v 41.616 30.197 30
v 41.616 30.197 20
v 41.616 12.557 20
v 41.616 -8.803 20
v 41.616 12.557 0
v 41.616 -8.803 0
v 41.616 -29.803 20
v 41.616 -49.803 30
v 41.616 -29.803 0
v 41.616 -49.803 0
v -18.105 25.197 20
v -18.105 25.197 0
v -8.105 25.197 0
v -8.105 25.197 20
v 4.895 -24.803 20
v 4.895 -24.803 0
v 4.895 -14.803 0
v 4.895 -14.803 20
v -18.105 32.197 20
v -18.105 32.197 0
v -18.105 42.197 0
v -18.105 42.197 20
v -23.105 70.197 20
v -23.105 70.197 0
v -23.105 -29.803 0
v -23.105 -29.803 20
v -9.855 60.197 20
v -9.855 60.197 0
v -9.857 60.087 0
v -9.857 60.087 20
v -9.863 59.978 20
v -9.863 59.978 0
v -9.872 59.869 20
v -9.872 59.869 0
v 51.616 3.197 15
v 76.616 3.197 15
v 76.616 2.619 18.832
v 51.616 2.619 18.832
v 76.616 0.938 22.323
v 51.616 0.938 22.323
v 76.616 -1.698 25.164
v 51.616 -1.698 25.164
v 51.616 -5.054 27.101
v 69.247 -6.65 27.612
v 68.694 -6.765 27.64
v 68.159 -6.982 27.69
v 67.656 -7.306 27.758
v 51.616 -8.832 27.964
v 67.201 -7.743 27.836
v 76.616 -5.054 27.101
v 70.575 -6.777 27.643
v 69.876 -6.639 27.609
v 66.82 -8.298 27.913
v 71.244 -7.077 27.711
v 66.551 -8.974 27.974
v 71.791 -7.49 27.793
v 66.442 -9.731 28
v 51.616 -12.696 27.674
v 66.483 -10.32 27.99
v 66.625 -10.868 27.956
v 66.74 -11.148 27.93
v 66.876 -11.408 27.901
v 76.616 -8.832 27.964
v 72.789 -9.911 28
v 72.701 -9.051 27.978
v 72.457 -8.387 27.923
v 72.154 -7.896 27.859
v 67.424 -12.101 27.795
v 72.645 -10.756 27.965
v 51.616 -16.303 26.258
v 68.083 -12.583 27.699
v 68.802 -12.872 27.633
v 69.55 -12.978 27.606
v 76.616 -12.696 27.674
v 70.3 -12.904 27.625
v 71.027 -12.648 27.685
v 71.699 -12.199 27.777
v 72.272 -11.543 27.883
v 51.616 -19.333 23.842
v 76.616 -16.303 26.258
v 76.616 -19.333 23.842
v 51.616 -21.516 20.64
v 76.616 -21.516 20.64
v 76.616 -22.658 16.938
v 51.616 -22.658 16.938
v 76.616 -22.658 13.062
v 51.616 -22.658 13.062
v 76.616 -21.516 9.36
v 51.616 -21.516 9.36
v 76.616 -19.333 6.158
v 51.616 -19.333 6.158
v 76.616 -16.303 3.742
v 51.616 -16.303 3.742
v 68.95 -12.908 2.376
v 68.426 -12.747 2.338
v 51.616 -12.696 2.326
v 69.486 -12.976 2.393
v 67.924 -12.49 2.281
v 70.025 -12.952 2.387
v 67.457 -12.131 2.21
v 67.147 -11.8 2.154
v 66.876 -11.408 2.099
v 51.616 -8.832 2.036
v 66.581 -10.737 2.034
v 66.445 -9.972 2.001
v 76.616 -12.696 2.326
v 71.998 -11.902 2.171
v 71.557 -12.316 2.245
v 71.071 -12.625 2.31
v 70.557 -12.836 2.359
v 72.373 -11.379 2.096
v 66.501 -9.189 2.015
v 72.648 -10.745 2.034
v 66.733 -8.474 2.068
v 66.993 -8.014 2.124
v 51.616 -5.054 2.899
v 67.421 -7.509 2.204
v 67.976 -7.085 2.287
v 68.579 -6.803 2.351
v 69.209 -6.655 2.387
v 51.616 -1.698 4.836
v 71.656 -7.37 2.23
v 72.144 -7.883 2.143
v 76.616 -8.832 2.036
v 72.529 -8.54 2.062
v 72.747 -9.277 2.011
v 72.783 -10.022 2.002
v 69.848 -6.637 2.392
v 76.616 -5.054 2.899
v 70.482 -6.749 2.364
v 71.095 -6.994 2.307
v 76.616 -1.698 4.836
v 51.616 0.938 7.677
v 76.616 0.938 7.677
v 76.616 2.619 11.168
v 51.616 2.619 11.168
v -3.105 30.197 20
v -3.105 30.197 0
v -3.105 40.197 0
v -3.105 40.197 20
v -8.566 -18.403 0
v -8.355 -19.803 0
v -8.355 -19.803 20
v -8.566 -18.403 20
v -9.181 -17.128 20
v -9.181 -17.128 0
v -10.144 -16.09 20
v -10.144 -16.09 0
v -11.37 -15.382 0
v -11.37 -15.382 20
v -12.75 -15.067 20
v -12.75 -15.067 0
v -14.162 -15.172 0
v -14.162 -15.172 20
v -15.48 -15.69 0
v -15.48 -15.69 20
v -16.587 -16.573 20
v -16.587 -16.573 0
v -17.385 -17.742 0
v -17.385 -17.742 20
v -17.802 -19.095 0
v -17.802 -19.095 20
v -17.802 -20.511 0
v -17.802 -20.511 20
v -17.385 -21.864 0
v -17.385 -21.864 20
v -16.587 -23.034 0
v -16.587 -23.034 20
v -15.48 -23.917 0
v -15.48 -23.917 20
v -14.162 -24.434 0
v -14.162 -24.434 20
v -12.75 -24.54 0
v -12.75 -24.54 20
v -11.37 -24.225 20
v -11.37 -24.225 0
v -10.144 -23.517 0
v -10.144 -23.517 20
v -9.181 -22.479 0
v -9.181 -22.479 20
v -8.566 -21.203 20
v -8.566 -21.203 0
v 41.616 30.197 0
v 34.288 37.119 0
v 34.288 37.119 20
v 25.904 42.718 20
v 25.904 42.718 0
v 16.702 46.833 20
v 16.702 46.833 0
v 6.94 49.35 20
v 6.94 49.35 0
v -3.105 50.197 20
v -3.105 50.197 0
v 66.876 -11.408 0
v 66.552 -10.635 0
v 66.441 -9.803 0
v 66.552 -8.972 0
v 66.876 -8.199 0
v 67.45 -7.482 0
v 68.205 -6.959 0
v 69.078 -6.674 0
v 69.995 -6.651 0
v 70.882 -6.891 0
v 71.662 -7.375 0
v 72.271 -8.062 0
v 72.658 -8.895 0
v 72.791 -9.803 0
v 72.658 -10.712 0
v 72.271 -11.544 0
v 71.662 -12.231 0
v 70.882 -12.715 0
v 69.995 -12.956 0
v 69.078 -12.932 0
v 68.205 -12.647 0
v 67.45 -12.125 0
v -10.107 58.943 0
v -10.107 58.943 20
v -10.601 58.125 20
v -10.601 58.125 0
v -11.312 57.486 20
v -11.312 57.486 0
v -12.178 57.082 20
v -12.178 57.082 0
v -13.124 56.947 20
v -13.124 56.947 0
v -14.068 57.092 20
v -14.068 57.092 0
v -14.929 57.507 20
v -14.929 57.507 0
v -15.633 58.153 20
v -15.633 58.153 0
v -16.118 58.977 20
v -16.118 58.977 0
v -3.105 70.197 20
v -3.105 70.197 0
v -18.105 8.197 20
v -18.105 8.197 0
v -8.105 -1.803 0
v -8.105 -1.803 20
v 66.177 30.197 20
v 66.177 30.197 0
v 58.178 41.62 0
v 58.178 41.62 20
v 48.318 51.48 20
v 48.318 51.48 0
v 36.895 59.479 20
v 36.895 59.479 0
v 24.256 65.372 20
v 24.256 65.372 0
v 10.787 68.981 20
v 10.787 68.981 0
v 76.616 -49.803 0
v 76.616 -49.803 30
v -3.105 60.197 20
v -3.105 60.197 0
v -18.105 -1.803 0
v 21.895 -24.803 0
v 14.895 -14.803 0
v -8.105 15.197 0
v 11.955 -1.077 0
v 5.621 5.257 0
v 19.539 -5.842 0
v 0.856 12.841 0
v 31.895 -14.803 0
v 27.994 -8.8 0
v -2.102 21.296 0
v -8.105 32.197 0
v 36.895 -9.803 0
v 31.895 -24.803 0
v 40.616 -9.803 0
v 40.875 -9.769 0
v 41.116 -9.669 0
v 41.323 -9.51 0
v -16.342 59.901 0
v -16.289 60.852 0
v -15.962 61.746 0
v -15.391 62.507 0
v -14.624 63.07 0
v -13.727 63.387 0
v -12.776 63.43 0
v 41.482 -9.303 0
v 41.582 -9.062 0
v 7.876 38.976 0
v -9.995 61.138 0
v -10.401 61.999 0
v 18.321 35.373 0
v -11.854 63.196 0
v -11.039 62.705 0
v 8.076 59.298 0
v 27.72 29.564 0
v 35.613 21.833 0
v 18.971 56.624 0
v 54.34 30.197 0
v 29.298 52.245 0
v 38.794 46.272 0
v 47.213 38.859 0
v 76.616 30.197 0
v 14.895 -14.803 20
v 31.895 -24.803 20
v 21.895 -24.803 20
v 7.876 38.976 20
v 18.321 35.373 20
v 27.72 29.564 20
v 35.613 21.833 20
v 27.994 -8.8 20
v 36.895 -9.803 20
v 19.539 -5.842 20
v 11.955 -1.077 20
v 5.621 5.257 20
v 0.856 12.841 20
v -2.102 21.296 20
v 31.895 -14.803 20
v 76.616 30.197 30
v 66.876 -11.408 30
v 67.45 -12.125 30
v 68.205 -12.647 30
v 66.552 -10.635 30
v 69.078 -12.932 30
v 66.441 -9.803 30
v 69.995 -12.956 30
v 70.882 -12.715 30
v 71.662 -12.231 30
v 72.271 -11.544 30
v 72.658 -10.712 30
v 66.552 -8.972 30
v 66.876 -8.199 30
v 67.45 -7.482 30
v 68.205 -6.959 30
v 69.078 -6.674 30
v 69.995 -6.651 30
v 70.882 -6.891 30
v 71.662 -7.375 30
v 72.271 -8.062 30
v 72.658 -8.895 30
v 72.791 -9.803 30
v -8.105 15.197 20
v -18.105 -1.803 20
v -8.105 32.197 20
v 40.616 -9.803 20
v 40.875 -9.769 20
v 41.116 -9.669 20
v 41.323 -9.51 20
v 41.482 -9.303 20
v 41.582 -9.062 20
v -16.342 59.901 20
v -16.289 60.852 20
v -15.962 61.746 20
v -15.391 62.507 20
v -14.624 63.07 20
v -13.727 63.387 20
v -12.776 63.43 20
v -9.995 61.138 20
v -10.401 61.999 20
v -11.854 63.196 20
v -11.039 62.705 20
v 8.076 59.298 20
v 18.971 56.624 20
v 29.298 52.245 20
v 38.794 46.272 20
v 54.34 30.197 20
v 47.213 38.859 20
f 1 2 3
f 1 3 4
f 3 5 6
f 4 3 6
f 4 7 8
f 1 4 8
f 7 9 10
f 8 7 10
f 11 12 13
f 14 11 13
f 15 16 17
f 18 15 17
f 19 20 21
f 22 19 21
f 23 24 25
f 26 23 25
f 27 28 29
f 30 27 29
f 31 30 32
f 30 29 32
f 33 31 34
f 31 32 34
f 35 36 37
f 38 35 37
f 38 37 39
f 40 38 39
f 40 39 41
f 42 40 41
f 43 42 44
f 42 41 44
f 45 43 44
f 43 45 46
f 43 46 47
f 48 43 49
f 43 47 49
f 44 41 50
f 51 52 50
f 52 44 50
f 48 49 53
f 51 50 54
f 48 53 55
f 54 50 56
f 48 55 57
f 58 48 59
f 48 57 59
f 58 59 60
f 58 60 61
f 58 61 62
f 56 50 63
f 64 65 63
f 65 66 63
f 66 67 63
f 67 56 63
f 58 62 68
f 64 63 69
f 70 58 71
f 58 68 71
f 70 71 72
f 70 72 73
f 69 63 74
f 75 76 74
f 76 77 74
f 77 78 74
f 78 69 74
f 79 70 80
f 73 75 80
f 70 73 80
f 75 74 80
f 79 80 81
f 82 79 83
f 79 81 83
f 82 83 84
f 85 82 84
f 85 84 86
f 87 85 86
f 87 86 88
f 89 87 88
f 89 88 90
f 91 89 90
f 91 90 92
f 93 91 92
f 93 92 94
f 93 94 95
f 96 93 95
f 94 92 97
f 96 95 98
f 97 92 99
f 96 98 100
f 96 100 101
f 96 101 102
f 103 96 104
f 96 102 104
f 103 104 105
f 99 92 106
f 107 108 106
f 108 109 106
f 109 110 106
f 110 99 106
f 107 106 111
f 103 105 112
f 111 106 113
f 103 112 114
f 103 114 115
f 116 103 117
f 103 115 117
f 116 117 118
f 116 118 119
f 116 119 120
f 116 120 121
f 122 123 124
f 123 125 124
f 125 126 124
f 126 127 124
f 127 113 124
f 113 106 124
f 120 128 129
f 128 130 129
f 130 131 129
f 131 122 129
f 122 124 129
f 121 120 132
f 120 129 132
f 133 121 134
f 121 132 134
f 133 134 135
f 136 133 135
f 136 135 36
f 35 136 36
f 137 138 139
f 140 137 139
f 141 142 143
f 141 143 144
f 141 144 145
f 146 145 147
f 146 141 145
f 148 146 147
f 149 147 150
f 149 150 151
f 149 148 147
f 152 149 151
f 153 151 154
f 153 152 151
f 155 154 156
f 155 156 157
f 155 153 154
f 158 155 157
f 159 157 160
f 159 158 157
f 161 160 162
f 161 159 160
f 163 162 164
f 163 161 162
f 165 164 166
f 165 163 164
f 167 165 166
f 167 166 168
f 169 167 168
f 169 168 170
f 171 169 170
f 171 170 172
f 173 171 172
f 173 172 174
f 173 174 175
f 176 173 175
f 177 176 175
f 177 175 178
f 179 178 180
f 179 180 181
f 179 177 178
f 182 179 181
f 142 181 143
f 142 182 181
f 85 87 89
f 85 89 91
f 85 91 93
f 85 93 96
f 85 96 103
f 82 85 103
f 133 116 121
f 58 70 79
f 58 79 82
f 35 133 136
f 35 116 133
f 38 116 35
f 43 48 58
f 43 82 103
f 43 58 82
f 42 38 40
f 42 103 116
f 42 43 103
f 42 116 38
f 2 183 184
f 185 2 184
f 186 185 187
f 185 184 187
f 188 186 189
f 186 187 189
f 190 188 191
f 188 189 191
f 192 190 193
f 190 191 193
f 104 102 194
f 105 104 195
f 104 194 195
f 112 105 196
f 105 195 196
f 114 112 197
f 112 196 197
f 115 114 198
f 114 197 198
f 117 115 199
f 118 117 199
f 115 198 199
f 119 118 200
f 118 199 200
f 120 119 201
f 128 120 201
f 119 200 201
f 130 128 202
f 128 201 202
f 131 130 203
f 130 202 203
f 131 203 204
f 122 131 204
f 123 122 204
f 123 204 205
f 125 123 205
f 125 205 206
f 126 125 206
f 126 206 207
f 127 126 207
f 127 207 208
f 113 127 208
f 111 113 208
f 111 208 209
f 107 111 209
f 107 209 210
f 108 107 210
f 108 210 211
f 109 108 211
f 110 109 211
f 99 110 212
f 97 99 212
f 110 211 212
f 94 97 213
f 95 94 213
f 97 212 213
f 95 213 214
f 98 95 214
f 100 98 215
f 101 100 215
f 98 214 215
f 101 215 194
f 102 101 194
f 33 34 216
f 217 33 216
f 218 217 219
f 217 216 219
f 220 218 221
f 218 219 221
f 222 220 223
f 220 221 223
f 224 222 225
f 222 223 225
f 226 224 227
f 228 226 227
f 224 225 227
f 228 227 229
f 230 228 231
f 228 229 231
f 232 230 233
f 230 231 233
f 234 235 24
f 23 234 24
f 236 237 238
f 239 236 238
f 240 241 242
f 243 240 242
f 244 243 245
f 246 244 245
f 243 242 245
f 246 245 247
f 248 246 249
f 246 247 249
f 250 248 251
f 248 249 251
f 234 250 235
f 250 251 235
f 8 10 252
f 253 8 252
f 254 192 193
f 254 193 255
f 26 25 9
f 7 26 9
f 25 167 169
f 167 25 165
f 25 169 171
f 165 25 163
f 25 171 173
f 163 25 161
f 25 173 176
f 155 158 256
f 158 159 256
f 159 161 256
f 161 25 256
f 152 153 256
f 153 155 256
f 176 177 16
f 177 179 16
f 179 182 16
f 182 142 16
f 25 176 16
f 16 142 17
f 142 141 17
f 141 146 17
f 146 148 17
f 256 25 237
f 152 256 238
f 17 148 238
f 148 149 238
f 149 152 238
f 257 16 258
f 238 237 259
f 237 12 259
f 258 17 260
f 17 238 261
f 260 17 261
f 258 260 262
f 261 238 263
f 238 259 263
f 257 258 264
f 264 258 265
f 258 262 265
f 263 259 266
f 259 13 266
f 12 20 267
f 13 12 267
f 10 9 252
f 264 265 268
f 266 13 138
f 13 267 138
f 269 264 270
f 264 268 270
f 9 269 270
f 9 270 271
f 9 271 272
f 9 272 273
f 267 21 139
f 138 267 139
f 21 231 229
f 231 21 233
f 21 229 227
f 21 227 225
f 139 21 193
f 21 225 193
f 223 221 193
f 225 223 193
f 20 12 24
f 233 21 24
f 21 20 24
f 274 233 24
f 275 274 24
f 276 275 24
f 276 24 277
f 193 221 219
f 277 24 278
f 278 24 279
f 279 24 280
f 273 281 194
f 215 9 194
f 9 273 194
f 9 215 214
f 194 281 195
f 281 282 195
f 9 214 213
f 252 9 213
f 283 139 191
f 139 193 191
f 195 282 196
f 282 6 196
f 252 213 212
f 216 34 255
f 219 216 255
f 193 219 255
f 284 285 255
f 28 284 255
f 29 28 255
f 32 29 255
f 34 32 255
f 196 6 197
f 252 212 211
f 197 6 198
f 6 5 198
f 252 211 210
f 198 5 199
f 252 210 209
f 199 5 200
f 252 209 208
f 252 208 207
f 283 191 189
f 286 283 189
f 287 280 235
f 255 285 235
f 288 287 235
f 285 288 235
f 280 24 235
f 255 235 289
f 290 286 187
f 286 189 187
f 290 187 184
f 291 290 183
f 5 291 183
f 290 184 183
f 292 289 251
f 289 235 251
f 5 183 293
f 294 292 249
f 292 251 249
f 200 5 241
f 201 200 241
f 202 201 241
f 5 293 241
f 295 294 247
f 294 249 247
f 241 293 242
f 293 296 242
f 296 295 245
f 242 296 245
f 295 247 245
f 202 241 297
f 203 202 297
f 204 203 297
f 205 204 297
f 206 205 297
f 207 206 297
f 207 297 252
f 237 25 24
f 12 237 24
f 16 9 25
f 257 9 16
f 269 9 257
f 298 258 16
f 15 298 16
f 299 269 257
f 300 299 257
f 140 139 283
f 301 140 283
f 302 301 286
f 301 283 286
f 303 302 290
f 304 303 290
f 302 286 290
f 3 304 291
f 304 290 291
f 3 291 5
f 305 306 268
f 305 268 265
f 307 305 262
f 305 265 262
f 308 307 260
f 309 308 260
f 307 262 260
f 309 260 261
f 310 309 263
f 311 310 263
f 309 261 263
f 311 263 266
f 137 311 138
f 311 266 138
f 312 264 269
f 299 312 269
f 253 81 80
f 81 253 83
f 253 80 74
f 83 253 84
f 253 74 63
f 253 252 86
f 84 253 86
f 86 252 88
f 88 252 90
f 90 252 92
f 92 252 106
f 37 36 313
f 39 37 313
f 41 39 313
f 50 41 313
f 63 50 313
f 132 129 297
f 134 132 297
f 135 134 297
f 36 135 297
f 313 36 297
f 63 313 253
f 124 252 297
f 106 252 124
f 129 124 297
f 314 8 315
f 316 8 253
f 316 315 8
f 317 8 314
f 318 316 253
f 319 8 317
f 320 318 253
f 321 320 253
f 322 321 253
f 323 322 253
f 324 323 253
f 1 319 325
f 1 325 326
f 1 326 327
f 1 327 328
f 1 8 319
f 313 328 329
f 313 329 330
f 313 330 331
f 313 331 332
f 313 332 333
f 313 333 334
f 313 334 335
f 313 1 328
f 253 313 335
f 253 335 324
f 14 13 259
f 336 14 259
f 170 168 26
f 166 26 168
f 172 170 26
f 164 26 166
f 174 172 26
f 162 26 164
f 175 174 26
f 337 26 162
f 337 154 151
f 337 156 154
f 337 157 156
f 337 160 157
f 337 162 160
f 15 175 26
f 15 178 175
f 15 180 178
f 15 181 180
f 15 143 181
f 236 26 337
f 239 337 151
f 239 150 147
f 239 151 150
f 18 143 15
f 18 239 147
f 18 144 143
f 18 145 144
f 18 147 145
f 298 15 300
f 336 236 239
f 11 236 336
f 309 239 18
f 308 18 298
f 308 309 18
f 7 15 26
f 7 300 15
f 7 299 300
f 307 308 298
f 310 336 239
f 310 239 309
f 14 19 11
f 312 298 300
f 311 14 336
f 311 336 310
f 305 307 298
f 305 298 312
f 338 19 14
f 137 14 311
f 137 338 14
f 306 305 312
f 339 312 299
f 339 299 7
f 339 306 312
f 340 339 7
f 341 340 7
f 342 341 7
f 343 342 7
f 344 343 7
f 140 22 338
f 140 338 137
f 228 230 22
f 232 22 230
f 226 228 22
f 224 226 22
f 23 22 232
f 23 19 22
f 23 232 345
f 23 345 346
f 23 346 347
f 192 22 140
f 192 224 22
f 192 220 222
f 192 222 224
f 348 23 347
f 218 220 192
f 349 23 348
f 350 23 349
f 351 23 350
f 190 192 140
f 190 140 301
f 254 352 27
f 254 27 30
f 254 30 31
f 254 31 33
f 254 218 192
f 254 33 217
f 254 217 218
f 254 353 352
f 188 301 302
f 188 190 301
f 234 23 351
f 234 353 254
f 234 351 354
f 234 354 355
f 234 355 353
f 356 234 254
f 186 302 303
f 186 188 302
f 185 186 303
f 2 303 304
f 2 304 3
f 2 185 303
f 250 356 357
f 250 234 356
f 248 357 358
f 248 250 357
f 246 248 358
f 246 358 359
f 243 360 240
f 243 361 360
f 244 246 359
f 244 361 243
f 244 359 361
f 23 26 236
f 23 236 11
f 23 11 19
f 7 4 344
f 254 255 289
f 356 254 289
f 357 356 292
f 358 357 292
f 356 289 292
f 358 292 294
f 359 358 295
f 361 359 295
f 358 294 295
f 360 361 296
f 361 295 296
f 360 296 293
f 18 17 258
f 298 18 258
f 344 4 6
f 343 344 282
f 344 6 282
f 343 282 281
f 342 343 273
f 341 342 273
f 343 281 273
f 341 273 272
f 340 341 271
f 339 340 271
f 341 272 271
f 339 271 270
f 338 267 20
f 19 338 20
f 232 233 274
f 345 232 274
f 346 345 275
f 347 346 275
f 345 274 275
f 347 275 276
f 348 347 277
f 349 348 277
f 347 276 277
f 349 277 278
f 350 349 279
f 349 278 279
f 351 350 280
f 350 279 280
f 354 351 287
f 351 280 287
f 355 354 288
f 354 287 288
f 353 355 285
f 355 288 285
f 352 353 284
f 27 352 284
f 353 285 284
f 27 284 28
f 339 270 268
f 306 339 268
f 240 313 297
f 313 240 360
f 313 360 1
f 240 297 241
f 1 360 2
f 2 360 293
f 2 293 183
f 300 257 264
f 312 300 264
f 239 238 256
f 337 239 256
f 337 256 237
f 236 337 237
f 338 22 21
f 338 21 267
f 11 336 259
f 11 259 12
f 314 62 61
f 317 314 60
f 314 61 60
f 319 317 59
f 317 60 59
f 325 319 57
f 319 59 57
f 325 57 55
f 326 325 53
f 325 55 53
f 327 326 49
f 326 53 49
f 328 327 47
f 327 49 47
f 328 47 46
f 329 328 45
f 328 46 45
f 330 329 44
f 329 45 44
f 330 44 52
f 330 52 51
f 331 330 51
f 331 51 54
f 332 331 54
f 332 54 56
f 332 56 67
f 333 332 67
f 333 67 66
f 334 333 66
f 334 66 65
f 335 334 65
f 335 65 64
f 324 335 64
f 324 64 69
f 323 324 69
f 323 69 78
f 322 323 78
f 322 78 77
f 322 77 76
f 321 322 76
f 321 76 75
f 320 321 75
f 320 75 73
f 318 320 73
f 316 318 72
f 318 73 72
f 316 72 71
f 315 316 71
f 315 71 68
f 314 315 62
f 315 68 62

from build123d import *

# Parameters (mm, degrees)
F0_R     = 4.75
F1_DEPTH = 20
F2_DEPTH = 30
F3_R     = 13
F4_DEPTH = 25


with BuildPart() as f1:
    # F0 (on Top) → F1 (new body)
    with BuildSketch(Plane.XY):
        with BuildLine():
            Line((76.6160202911, 30.1966461055), (66.1766930438, 30.1966461055))
            ThreePointArc((66.1766930438, 30.1966461055), (73.2373422542, 14.1088810364), (76.6160202911, -3.132159736))
            Line((76.6160202911, -3.132159736), (76.6160202911, 30.1966461055))
        make_face()
        with BuildLine():
            ThreePointArc((76.6160202911, -3.132159736), (73.2373422542, 14.1088810364), (66.1766930438, 30.1966461055))
            Line((66.1766930438, 30.1966461055), (54.3402872065, 30.1966461055))
            ThreePointArc((54.3402872065, 30.1966461055), (63.4377209443, 11.9226935784), (66.8762698088, -8.198862606))
            ThreePointArc((66.8762698088, -8.198862606), (70.4472594921, -6.7390976404), (72.7910202911, -9.8033538945))
            ThreePointArc((72.7910202911, -9.8033538945), (70.4472594921, -12.8676101486), (66.8762698088, -11.407845183))
            ThreePointArc((66.8762698088, -11.407845183), (63.4377209443, -31.5294013674), (54.3402872065, -49.8033538945))
            Line((54.3402872065, -49.8033538945), (66.1766930438, -49.8033538945))
            ThreePointArc((66.1766930438, -49.8033538945), (73.2373422542, -33.7155888254), (76.6160202911, -16.474548053))
            Line((76.6160202911, -16.474548053), (76.6160202911, -3.132159736))
        make_face()
        with BuildLine():
            ThreePointArc((66.8762698088, -8.198862606), (63.4377209443, 11.9226935784), (54.3402872065, 30.1966461055))
            Line((54.3402872065, 30.1966461055), (41.6160202911, 30.1966461055))
            ThreePointArc((41.6160202911, 30.1966461055), (52.9450022789, 11.6059714919), (56.8946607411, -9.8033538945))
            ThreePointArc((56.8946607411, -9.8033538945), (52.9450022789, -31.2126792809), (41.6160202911, -49.8033538945))
            Line((41.6160202911, -49.8033538945), (54.3402872065, -49.8033538945))
            ThreePointArc((54.3402872065, -49.8033538945), (63.4377209443, -31.5294013674), (66.8762698088, -11.407845183))
            ThreePointArc((66.8762698088, -11.407845183), (66.4410202911, -9.8033538945), (66.8762698088, -8.198862606))
        make_face()
        with BuildLine():
            ThreePointArc((76.6160202911, -16.474548053), (73.2373422542, -33.7155888254), (66.1766930438, -49.8033538945))
            Line((66.1766930438, -49.8033538945), (76.6160202911, -49.8033538945))
            Line((76.6160202911, -49.8033538945), (76.6160202911, -16.474548053))
        make_face()
        with BuildLine():
            ThreePointArc((56.8946607411, -9.8033538945), (52.9450022789, 11.6059714919), (41.6160202911, 30.1966461055))
            Line((41.6160202911, 30.1966461055), (41.6160202911, 12.5573258805))
            ThreePointArc((41.6160202911, 12.5573258805), (45.5571102145, 1.6842921329), (46.8946607411, -9.8033538945))
            ThreePointArc((46.8946607411, -9.8033538945), (45.5571102145, -21.2909999219), (41.6160202911, -32.1640336695))
            Line((41.6160202911, -32.1640336695), (41.6160202911, -49.8033538945))
            ThreePointArc((41.6160202911, -49.8033538945), (52.9450022789, -31.2126792809), (56.8946607411, -9.8033538945))
        make_face()
        with BuildLine():
            ThreePointArc((46.8946607411, -9.8033538945), (45.5571102145, 1.6842921329), (41.6160202911, 12.5573258805))
            Line((41.6160202911, 12.5573258805), (41.6160202911, -8.8033538945))
            Line((41.6160202911, -8.8033538945), (41.6160202911, -29.8033538945))
            Line((41.6160202911, -29.8033538945), (41.6160202911, -30.8033538945))
            Line((41.6160202911, -30.8033538945), (41.6160202911, -32.1640336695))
            ThreePointArc((41.6160202911, -32.1640336695), (45.5571102145, -21.2909999219), (46.8946607411, -9.8033538945))
        make_face()
        with BuildLine():
            Line((-3.1053392589, 30.1966461055), (-3.1053392589, 40.1966461055))
            ThreePointArc((-3.1053392589, 40.1966461055), (-8.9600600243, 39.8526854639), (-14.7342290493, 38.8255358959))
            Line((-14.7342290493, 38.8255358959), (-8.1053392589, 32.1966461055))
            Line((-8.1053392589, 32.1966461055), (-18.1053392589, 32.1966461055))
            Line((-18.1053392589, 32.1966461055), (-18.1053392589, 37.8936061763))
            ThreePointArc((-18.1053392589, 37.8936061763), (-20.630331421, 37.0247856128), (-23.1053392589, 36.0224030551))
            Line((-23.1053392589, 36.0224030551), (-23.1053392589, -29.8033538945))
            Line((-23.1053392589, -29.8033538945), (-3.1053392589, -29.8033538945))
            Line((-3.1053392589, -29.8033538945), (40.6160202911, -29.8033538945))
            Line((40.6160202911, -29.8033538945), (41.6160202911, -29.8033538945))
            Line((41.6160202911, -29.8033538945), (41.6160202911, -8.8033538945))
            ThreePointArc((41.6160202911, -8.8033538945), (41.3231270723, -9.5104606757), (40.6160202911, -9.8033538945))
            Line((40.6160202911, -9.8033538945), (36.8946607411, -9.8033538945))
            ThreePointArc((36.8946607411, -9.8033538945), (8.6103894936, 1.912374858), (-3.1053392589, 30.1966461055))
        make_face()
        with Locations((-13.1053392589, -19.8033538945)):
            Circle(F0_R, mode=Mode.SUBTRACT)
        Polygon((4.8946607411, -14.8033538945), (14.8946607411, -14.8033538945), (4.8946607411, -24.8033538945), align=None, mode=Mode.SUBTRACT)
        Polygon((31.8946607411, -24.8033538945), (21.8946607411, -24.8033538945), (31.8946607411, -14.8033538945), align=None, mode=Mode.SUBTRACT)
        Polygon((-18.1053392589, -1.8033538945), (-18.1053392589, 8.1966461055), (-8.1053392589, -1.8033538945), align=None, mode=Mode.SUBTRACT)
        Polygon((-8.1053392589, 25.1966461055), (-8.1053392589, 15.1966461055), (-18.1053392589, 25.1966461055), align=None, mode=Mode.SUBTRACT)
        with BuildLine():
            Line((-3.1053392589, 40.1966461055), (-3.1053392589, 50.1966461055))
            ThreePointArc((-3.1053392589, 50.1966461055), (-13.2514579825, 49.3325596847), (-23.1053392589, 46.7651886004))
            Line((-23.1053392589, 46.7651886004), (-23.1053392589, 36.0224030551))
            ThreePointArc((-23.1053392589, 36.0224030551), (-20.630331421, 37.0247856128), (-18.1053392589, 37.8936061763))
            Line((-18.1053392589, 37.8936061763), (-18.1053392589, 42.1966461055))
            Line((-18.1053392589, 42.1966461055), (-14.7342290493, 38.8255358959))
            ThreePointArc((-14.7342290493, 38.8255358959), (-8.9600600243, 39.8526854639), (-3.1053392589, 40.1966461055))
        make_face()
        with BuildLine():
            Line((-3.1053392589, 50.1966461055), (-3.1053392589, 60.1966461055))
            ThreePointArc((-3.1053392589, 60.1966461055), (-6.4925947199, 60.1146445068), (-9.8719141705, 59.8688318324))
            ThreePointArc((-9.8719141705, 59.8688318324), (-12.6457198511, 56.9793102511), (-16.1176393473, 58.9765853786))
            ThreePointArc((-16.1176393473, 58.9765853786), (-19.6333066276, 58.2174245093), (-23.1053392589, 57.2786854305))
            Line((-23.1053392589, 57.2786854305), (-23.1053392589, 46.7651886004))
            ThreePointArc((-23.1053392589, 46.7651886004), (-13.2514579825, 49.3325596847), (-3.1053392589, 50.1966461055))
        make_face()
        with BuildLine():
            Line((-3.1053392589, 60.1966461055), (-3.1053392589, 70.1966461055))
            ThreePointArc((-3.1053392589, 70.1966461055), (-13.1856826575, 69.5590218069), (-23.1053392589, 67.6563130296))
            Line((-23.1053392589, 67.6563130296), (-23.1053392589, 57.2786854305))
            ThreePointArc((-23.1053392589, 57.2786854305), (-19.6333066276, 58.2174245093), (-16.1176393473, 58.9765853786))
            ThreePointArc((-16.1176393473, 58.9765853786), (-13.7268393445, 63.3866676797), (-9.8553392589, 60.1966461055))
            ThreePointArc((-9.8553392589, 60.1966461055), (-9.8594856318, 60.0325295879), (-9.8719141705, 59.8688318324))
            ThreePointArc((-9.8719141705, 59.8688318324), (-6.4925947199, 60.1146445068), (-3.1053392589, 60.1966461055))
        make_face()
        with BuildLine():
            ThreePointArc((-23.1053392589, 67.6563130296), (-13.1856826575, 69.5590218069), (-3.1053392589, 70.1966461055))
            Line((-3.1053392589, 70.1966461055), (-23.1053392589, 70.1966461055))
            Line((-23.1053392589, 70.1966461055), (-23.1053392589, 67.6563130296))
        make_face()
        with BuildLine():
            ThreePointArc((66.1766930438, 30.1966461055), (36.8946607411, 59.4786784083), (-3.1053392589, 70.1966461055))
            Line((-3.1053392589, 70.1966461055), (-3.1053392589, 60.1966461055))
            ThreePointArc((-3.1053392589, 60.1966461055), (29.2983642331, 52.2450143355), (54.3402872065, 30.1966461055))
            Line((54.3402872065, 30.1966461055), (66.1766930438, 30.1966461055))
        make_face()
        with BuildLine():
            ThreePointArc((41.6160202911, 30.1966461055), (21.3895581689, 44.968901856), (-3.1053392589, 50.1966461055))
            Line((-3.1053392589, 50.1966461055), (-3.1053392589, 40.1966461055))
            ThreePointArc((-3.1053392589, 40.1966461055), (23.181216347, 32.7291865231), (41.6160202911, 12.5573258805))
            Line((41.6160202911, 12.5573258805), (41.6160202911, 30.1966461055))
        make_face()
    extrude(amount=F1_DEPTH)

    # F0 (on Top) → F2 (join)
    with BuildSketch(Plane.XY):
        with BuildLine():
            ThreePointArc((56.8946607411, -9.8033538945), (52.9450022789, 11.6059714919), (41.6160202911, 30.1966461055))
            Line((41.6160202911, 30.1966461055), (41.6160202911, 12.5573258805))
            ThreePointArc((41.6160202911, 12.5573258805), (45.5571102145, 1.6842921329), (46.8946607411, -9.8033538945))
            ThreePointArc((46.8946607411, -9.8033538945), (45.5571102145, -21.2909999219), (41.6160202911, -32.1640336695))
            Line((41.6160202911, -32.1640336695), (41.6160202911, -49.8033538945))
            ThreePointArc((41.6160202911, -49.8033538945), (52.9450022789, -31.2126792809), (56.8946607411, -9.8033538945))
        make_face()
        with BuildLine():
            ThreePointArc((66.8762698088, -8.198862606), (63.4377209443, 11.9226935784), (54.3402872065, 30.1966461055))
            Line((54.3402872065, 30.1966461055), (41.6160202911, 30.1966461055))
            ThreePointArc((41.6160202911, 30.1966461055), (52.9450022789, 11.6059714919), (56.8946607411, -9.8033538945))
            ThreePointArc((56.8946607411, -9.8033538945), (52.9450022789, -31.2126792809), (41.6160202911, -49.8033538945))
            Line((41.6160202911, -49.8033538945), (54.3402872065, -49.8033538945))
            ThreePointArc((54.3402872065, -49.8033538945), (63.4377209443, -31.5294013674), (66.8762698088, -11.407845183))
            ThreePointArc((66.8762698088, -11.407845183), (66.4410202911, -9.8033538945), (66.8762698088, -8.198862606))
        make_face()
        with BuildLine():
            ThreePointArc((76.6160202911, -3.132159736), (73.2373422542, 14.1088810364), (66.1766930438, 30.1966461055))
            Line((66.1766930438, 30.1966461055), (54.3402872065, 30.1966461055))
            ThreePointArc((54.3402872065, 30.1966461055), (63.4377209443, 11.9226935784), (66.8762698088, -8.198862606))
            ThreePointArc((66.8762698088, -8.198862606), (70.4472594921, -6.7390976404), (72.7910202911, -9.8033538945))
            ThreePointArc((72.7910202911, -9.8033538945), (70.4472594921, -12.8676101486), (66.8762698088, -11.407845183))
            ThreePointArc((66.8762698088, -11.407845183), (63.4377209443, -31.5294013674), (54.3402872065, -49.8033538945))
            Line((54.3402872065, -49.8033538945), (66.1766930438, -49.8033538945))
            ThreePointArc((66.1766930438, -49.8033538945), (73.2373422542, -33.7155888254), (76.6160202911, -16.474548053))
            Line((76.6160202911, -16.474548053), (76.6160202911, -3.132159736))
        make_face()
        with BuildLine():
            ThreePointArc((76.6160202911, -16.474548053), (73.2373422542, -33.7155888254), (66.1766930438, -49.8033538945))
            Line((66.1766930438, -49.8033538945), (76.6160202911, -49.8033538945))
            Line((76.6160202911, -49.8033538945), (76.6160202911, -16.474548053))
        make_face()
        with BuildLine():
            Line((76.6160202911, 30.1966461055), (66.1766930438, 30.1966461055))
            ThreePointArc((66.1766930438, 30.1966461055), (73.2373422542, 14.1088810364), (76.6160202911, -3.132159736))
            Line((76.6160202911, -3.132159736), (76.6160202911, 30.1966461055))
        make_face()
        with BuildLine():
            ThreePointArc((46.8946607411, -9.8033538945), (45.5571102145, 1.6842921329), (41.6160202911, 12.5573258805))
            Line((41.6160202911, 12.5573258805), (41.6160202911, -8.8033538945))
            Line((41.6160202911, -8.8033538945), (41.6160202911, -29.8033538945))
            Line((41.6160202911, -29.8033538945), (41.6160202911, -30.8033538945))
            Line((41.6160202911, -30.8033538945), (41.6160202911, -32.1640336695))
            ThreePointArc((41.6160202911, -32.1640336695), (45.5571102145, -21.2909999219), (46.8946607411, -9.8033538945))
        make_face()
    extrude(amount=F2_DEPTH)

    # F3 (on face) → F4 (cut)
    with BuildSketch(Plane.YZ.offset(76.6160202911)):
        with Locations((-9.8033538945, 15)):
            Circle(F3_R)
    extrude(amount=-F4_DEPTH, mode=Mode.SUBTRACT)


solid = f1.part
